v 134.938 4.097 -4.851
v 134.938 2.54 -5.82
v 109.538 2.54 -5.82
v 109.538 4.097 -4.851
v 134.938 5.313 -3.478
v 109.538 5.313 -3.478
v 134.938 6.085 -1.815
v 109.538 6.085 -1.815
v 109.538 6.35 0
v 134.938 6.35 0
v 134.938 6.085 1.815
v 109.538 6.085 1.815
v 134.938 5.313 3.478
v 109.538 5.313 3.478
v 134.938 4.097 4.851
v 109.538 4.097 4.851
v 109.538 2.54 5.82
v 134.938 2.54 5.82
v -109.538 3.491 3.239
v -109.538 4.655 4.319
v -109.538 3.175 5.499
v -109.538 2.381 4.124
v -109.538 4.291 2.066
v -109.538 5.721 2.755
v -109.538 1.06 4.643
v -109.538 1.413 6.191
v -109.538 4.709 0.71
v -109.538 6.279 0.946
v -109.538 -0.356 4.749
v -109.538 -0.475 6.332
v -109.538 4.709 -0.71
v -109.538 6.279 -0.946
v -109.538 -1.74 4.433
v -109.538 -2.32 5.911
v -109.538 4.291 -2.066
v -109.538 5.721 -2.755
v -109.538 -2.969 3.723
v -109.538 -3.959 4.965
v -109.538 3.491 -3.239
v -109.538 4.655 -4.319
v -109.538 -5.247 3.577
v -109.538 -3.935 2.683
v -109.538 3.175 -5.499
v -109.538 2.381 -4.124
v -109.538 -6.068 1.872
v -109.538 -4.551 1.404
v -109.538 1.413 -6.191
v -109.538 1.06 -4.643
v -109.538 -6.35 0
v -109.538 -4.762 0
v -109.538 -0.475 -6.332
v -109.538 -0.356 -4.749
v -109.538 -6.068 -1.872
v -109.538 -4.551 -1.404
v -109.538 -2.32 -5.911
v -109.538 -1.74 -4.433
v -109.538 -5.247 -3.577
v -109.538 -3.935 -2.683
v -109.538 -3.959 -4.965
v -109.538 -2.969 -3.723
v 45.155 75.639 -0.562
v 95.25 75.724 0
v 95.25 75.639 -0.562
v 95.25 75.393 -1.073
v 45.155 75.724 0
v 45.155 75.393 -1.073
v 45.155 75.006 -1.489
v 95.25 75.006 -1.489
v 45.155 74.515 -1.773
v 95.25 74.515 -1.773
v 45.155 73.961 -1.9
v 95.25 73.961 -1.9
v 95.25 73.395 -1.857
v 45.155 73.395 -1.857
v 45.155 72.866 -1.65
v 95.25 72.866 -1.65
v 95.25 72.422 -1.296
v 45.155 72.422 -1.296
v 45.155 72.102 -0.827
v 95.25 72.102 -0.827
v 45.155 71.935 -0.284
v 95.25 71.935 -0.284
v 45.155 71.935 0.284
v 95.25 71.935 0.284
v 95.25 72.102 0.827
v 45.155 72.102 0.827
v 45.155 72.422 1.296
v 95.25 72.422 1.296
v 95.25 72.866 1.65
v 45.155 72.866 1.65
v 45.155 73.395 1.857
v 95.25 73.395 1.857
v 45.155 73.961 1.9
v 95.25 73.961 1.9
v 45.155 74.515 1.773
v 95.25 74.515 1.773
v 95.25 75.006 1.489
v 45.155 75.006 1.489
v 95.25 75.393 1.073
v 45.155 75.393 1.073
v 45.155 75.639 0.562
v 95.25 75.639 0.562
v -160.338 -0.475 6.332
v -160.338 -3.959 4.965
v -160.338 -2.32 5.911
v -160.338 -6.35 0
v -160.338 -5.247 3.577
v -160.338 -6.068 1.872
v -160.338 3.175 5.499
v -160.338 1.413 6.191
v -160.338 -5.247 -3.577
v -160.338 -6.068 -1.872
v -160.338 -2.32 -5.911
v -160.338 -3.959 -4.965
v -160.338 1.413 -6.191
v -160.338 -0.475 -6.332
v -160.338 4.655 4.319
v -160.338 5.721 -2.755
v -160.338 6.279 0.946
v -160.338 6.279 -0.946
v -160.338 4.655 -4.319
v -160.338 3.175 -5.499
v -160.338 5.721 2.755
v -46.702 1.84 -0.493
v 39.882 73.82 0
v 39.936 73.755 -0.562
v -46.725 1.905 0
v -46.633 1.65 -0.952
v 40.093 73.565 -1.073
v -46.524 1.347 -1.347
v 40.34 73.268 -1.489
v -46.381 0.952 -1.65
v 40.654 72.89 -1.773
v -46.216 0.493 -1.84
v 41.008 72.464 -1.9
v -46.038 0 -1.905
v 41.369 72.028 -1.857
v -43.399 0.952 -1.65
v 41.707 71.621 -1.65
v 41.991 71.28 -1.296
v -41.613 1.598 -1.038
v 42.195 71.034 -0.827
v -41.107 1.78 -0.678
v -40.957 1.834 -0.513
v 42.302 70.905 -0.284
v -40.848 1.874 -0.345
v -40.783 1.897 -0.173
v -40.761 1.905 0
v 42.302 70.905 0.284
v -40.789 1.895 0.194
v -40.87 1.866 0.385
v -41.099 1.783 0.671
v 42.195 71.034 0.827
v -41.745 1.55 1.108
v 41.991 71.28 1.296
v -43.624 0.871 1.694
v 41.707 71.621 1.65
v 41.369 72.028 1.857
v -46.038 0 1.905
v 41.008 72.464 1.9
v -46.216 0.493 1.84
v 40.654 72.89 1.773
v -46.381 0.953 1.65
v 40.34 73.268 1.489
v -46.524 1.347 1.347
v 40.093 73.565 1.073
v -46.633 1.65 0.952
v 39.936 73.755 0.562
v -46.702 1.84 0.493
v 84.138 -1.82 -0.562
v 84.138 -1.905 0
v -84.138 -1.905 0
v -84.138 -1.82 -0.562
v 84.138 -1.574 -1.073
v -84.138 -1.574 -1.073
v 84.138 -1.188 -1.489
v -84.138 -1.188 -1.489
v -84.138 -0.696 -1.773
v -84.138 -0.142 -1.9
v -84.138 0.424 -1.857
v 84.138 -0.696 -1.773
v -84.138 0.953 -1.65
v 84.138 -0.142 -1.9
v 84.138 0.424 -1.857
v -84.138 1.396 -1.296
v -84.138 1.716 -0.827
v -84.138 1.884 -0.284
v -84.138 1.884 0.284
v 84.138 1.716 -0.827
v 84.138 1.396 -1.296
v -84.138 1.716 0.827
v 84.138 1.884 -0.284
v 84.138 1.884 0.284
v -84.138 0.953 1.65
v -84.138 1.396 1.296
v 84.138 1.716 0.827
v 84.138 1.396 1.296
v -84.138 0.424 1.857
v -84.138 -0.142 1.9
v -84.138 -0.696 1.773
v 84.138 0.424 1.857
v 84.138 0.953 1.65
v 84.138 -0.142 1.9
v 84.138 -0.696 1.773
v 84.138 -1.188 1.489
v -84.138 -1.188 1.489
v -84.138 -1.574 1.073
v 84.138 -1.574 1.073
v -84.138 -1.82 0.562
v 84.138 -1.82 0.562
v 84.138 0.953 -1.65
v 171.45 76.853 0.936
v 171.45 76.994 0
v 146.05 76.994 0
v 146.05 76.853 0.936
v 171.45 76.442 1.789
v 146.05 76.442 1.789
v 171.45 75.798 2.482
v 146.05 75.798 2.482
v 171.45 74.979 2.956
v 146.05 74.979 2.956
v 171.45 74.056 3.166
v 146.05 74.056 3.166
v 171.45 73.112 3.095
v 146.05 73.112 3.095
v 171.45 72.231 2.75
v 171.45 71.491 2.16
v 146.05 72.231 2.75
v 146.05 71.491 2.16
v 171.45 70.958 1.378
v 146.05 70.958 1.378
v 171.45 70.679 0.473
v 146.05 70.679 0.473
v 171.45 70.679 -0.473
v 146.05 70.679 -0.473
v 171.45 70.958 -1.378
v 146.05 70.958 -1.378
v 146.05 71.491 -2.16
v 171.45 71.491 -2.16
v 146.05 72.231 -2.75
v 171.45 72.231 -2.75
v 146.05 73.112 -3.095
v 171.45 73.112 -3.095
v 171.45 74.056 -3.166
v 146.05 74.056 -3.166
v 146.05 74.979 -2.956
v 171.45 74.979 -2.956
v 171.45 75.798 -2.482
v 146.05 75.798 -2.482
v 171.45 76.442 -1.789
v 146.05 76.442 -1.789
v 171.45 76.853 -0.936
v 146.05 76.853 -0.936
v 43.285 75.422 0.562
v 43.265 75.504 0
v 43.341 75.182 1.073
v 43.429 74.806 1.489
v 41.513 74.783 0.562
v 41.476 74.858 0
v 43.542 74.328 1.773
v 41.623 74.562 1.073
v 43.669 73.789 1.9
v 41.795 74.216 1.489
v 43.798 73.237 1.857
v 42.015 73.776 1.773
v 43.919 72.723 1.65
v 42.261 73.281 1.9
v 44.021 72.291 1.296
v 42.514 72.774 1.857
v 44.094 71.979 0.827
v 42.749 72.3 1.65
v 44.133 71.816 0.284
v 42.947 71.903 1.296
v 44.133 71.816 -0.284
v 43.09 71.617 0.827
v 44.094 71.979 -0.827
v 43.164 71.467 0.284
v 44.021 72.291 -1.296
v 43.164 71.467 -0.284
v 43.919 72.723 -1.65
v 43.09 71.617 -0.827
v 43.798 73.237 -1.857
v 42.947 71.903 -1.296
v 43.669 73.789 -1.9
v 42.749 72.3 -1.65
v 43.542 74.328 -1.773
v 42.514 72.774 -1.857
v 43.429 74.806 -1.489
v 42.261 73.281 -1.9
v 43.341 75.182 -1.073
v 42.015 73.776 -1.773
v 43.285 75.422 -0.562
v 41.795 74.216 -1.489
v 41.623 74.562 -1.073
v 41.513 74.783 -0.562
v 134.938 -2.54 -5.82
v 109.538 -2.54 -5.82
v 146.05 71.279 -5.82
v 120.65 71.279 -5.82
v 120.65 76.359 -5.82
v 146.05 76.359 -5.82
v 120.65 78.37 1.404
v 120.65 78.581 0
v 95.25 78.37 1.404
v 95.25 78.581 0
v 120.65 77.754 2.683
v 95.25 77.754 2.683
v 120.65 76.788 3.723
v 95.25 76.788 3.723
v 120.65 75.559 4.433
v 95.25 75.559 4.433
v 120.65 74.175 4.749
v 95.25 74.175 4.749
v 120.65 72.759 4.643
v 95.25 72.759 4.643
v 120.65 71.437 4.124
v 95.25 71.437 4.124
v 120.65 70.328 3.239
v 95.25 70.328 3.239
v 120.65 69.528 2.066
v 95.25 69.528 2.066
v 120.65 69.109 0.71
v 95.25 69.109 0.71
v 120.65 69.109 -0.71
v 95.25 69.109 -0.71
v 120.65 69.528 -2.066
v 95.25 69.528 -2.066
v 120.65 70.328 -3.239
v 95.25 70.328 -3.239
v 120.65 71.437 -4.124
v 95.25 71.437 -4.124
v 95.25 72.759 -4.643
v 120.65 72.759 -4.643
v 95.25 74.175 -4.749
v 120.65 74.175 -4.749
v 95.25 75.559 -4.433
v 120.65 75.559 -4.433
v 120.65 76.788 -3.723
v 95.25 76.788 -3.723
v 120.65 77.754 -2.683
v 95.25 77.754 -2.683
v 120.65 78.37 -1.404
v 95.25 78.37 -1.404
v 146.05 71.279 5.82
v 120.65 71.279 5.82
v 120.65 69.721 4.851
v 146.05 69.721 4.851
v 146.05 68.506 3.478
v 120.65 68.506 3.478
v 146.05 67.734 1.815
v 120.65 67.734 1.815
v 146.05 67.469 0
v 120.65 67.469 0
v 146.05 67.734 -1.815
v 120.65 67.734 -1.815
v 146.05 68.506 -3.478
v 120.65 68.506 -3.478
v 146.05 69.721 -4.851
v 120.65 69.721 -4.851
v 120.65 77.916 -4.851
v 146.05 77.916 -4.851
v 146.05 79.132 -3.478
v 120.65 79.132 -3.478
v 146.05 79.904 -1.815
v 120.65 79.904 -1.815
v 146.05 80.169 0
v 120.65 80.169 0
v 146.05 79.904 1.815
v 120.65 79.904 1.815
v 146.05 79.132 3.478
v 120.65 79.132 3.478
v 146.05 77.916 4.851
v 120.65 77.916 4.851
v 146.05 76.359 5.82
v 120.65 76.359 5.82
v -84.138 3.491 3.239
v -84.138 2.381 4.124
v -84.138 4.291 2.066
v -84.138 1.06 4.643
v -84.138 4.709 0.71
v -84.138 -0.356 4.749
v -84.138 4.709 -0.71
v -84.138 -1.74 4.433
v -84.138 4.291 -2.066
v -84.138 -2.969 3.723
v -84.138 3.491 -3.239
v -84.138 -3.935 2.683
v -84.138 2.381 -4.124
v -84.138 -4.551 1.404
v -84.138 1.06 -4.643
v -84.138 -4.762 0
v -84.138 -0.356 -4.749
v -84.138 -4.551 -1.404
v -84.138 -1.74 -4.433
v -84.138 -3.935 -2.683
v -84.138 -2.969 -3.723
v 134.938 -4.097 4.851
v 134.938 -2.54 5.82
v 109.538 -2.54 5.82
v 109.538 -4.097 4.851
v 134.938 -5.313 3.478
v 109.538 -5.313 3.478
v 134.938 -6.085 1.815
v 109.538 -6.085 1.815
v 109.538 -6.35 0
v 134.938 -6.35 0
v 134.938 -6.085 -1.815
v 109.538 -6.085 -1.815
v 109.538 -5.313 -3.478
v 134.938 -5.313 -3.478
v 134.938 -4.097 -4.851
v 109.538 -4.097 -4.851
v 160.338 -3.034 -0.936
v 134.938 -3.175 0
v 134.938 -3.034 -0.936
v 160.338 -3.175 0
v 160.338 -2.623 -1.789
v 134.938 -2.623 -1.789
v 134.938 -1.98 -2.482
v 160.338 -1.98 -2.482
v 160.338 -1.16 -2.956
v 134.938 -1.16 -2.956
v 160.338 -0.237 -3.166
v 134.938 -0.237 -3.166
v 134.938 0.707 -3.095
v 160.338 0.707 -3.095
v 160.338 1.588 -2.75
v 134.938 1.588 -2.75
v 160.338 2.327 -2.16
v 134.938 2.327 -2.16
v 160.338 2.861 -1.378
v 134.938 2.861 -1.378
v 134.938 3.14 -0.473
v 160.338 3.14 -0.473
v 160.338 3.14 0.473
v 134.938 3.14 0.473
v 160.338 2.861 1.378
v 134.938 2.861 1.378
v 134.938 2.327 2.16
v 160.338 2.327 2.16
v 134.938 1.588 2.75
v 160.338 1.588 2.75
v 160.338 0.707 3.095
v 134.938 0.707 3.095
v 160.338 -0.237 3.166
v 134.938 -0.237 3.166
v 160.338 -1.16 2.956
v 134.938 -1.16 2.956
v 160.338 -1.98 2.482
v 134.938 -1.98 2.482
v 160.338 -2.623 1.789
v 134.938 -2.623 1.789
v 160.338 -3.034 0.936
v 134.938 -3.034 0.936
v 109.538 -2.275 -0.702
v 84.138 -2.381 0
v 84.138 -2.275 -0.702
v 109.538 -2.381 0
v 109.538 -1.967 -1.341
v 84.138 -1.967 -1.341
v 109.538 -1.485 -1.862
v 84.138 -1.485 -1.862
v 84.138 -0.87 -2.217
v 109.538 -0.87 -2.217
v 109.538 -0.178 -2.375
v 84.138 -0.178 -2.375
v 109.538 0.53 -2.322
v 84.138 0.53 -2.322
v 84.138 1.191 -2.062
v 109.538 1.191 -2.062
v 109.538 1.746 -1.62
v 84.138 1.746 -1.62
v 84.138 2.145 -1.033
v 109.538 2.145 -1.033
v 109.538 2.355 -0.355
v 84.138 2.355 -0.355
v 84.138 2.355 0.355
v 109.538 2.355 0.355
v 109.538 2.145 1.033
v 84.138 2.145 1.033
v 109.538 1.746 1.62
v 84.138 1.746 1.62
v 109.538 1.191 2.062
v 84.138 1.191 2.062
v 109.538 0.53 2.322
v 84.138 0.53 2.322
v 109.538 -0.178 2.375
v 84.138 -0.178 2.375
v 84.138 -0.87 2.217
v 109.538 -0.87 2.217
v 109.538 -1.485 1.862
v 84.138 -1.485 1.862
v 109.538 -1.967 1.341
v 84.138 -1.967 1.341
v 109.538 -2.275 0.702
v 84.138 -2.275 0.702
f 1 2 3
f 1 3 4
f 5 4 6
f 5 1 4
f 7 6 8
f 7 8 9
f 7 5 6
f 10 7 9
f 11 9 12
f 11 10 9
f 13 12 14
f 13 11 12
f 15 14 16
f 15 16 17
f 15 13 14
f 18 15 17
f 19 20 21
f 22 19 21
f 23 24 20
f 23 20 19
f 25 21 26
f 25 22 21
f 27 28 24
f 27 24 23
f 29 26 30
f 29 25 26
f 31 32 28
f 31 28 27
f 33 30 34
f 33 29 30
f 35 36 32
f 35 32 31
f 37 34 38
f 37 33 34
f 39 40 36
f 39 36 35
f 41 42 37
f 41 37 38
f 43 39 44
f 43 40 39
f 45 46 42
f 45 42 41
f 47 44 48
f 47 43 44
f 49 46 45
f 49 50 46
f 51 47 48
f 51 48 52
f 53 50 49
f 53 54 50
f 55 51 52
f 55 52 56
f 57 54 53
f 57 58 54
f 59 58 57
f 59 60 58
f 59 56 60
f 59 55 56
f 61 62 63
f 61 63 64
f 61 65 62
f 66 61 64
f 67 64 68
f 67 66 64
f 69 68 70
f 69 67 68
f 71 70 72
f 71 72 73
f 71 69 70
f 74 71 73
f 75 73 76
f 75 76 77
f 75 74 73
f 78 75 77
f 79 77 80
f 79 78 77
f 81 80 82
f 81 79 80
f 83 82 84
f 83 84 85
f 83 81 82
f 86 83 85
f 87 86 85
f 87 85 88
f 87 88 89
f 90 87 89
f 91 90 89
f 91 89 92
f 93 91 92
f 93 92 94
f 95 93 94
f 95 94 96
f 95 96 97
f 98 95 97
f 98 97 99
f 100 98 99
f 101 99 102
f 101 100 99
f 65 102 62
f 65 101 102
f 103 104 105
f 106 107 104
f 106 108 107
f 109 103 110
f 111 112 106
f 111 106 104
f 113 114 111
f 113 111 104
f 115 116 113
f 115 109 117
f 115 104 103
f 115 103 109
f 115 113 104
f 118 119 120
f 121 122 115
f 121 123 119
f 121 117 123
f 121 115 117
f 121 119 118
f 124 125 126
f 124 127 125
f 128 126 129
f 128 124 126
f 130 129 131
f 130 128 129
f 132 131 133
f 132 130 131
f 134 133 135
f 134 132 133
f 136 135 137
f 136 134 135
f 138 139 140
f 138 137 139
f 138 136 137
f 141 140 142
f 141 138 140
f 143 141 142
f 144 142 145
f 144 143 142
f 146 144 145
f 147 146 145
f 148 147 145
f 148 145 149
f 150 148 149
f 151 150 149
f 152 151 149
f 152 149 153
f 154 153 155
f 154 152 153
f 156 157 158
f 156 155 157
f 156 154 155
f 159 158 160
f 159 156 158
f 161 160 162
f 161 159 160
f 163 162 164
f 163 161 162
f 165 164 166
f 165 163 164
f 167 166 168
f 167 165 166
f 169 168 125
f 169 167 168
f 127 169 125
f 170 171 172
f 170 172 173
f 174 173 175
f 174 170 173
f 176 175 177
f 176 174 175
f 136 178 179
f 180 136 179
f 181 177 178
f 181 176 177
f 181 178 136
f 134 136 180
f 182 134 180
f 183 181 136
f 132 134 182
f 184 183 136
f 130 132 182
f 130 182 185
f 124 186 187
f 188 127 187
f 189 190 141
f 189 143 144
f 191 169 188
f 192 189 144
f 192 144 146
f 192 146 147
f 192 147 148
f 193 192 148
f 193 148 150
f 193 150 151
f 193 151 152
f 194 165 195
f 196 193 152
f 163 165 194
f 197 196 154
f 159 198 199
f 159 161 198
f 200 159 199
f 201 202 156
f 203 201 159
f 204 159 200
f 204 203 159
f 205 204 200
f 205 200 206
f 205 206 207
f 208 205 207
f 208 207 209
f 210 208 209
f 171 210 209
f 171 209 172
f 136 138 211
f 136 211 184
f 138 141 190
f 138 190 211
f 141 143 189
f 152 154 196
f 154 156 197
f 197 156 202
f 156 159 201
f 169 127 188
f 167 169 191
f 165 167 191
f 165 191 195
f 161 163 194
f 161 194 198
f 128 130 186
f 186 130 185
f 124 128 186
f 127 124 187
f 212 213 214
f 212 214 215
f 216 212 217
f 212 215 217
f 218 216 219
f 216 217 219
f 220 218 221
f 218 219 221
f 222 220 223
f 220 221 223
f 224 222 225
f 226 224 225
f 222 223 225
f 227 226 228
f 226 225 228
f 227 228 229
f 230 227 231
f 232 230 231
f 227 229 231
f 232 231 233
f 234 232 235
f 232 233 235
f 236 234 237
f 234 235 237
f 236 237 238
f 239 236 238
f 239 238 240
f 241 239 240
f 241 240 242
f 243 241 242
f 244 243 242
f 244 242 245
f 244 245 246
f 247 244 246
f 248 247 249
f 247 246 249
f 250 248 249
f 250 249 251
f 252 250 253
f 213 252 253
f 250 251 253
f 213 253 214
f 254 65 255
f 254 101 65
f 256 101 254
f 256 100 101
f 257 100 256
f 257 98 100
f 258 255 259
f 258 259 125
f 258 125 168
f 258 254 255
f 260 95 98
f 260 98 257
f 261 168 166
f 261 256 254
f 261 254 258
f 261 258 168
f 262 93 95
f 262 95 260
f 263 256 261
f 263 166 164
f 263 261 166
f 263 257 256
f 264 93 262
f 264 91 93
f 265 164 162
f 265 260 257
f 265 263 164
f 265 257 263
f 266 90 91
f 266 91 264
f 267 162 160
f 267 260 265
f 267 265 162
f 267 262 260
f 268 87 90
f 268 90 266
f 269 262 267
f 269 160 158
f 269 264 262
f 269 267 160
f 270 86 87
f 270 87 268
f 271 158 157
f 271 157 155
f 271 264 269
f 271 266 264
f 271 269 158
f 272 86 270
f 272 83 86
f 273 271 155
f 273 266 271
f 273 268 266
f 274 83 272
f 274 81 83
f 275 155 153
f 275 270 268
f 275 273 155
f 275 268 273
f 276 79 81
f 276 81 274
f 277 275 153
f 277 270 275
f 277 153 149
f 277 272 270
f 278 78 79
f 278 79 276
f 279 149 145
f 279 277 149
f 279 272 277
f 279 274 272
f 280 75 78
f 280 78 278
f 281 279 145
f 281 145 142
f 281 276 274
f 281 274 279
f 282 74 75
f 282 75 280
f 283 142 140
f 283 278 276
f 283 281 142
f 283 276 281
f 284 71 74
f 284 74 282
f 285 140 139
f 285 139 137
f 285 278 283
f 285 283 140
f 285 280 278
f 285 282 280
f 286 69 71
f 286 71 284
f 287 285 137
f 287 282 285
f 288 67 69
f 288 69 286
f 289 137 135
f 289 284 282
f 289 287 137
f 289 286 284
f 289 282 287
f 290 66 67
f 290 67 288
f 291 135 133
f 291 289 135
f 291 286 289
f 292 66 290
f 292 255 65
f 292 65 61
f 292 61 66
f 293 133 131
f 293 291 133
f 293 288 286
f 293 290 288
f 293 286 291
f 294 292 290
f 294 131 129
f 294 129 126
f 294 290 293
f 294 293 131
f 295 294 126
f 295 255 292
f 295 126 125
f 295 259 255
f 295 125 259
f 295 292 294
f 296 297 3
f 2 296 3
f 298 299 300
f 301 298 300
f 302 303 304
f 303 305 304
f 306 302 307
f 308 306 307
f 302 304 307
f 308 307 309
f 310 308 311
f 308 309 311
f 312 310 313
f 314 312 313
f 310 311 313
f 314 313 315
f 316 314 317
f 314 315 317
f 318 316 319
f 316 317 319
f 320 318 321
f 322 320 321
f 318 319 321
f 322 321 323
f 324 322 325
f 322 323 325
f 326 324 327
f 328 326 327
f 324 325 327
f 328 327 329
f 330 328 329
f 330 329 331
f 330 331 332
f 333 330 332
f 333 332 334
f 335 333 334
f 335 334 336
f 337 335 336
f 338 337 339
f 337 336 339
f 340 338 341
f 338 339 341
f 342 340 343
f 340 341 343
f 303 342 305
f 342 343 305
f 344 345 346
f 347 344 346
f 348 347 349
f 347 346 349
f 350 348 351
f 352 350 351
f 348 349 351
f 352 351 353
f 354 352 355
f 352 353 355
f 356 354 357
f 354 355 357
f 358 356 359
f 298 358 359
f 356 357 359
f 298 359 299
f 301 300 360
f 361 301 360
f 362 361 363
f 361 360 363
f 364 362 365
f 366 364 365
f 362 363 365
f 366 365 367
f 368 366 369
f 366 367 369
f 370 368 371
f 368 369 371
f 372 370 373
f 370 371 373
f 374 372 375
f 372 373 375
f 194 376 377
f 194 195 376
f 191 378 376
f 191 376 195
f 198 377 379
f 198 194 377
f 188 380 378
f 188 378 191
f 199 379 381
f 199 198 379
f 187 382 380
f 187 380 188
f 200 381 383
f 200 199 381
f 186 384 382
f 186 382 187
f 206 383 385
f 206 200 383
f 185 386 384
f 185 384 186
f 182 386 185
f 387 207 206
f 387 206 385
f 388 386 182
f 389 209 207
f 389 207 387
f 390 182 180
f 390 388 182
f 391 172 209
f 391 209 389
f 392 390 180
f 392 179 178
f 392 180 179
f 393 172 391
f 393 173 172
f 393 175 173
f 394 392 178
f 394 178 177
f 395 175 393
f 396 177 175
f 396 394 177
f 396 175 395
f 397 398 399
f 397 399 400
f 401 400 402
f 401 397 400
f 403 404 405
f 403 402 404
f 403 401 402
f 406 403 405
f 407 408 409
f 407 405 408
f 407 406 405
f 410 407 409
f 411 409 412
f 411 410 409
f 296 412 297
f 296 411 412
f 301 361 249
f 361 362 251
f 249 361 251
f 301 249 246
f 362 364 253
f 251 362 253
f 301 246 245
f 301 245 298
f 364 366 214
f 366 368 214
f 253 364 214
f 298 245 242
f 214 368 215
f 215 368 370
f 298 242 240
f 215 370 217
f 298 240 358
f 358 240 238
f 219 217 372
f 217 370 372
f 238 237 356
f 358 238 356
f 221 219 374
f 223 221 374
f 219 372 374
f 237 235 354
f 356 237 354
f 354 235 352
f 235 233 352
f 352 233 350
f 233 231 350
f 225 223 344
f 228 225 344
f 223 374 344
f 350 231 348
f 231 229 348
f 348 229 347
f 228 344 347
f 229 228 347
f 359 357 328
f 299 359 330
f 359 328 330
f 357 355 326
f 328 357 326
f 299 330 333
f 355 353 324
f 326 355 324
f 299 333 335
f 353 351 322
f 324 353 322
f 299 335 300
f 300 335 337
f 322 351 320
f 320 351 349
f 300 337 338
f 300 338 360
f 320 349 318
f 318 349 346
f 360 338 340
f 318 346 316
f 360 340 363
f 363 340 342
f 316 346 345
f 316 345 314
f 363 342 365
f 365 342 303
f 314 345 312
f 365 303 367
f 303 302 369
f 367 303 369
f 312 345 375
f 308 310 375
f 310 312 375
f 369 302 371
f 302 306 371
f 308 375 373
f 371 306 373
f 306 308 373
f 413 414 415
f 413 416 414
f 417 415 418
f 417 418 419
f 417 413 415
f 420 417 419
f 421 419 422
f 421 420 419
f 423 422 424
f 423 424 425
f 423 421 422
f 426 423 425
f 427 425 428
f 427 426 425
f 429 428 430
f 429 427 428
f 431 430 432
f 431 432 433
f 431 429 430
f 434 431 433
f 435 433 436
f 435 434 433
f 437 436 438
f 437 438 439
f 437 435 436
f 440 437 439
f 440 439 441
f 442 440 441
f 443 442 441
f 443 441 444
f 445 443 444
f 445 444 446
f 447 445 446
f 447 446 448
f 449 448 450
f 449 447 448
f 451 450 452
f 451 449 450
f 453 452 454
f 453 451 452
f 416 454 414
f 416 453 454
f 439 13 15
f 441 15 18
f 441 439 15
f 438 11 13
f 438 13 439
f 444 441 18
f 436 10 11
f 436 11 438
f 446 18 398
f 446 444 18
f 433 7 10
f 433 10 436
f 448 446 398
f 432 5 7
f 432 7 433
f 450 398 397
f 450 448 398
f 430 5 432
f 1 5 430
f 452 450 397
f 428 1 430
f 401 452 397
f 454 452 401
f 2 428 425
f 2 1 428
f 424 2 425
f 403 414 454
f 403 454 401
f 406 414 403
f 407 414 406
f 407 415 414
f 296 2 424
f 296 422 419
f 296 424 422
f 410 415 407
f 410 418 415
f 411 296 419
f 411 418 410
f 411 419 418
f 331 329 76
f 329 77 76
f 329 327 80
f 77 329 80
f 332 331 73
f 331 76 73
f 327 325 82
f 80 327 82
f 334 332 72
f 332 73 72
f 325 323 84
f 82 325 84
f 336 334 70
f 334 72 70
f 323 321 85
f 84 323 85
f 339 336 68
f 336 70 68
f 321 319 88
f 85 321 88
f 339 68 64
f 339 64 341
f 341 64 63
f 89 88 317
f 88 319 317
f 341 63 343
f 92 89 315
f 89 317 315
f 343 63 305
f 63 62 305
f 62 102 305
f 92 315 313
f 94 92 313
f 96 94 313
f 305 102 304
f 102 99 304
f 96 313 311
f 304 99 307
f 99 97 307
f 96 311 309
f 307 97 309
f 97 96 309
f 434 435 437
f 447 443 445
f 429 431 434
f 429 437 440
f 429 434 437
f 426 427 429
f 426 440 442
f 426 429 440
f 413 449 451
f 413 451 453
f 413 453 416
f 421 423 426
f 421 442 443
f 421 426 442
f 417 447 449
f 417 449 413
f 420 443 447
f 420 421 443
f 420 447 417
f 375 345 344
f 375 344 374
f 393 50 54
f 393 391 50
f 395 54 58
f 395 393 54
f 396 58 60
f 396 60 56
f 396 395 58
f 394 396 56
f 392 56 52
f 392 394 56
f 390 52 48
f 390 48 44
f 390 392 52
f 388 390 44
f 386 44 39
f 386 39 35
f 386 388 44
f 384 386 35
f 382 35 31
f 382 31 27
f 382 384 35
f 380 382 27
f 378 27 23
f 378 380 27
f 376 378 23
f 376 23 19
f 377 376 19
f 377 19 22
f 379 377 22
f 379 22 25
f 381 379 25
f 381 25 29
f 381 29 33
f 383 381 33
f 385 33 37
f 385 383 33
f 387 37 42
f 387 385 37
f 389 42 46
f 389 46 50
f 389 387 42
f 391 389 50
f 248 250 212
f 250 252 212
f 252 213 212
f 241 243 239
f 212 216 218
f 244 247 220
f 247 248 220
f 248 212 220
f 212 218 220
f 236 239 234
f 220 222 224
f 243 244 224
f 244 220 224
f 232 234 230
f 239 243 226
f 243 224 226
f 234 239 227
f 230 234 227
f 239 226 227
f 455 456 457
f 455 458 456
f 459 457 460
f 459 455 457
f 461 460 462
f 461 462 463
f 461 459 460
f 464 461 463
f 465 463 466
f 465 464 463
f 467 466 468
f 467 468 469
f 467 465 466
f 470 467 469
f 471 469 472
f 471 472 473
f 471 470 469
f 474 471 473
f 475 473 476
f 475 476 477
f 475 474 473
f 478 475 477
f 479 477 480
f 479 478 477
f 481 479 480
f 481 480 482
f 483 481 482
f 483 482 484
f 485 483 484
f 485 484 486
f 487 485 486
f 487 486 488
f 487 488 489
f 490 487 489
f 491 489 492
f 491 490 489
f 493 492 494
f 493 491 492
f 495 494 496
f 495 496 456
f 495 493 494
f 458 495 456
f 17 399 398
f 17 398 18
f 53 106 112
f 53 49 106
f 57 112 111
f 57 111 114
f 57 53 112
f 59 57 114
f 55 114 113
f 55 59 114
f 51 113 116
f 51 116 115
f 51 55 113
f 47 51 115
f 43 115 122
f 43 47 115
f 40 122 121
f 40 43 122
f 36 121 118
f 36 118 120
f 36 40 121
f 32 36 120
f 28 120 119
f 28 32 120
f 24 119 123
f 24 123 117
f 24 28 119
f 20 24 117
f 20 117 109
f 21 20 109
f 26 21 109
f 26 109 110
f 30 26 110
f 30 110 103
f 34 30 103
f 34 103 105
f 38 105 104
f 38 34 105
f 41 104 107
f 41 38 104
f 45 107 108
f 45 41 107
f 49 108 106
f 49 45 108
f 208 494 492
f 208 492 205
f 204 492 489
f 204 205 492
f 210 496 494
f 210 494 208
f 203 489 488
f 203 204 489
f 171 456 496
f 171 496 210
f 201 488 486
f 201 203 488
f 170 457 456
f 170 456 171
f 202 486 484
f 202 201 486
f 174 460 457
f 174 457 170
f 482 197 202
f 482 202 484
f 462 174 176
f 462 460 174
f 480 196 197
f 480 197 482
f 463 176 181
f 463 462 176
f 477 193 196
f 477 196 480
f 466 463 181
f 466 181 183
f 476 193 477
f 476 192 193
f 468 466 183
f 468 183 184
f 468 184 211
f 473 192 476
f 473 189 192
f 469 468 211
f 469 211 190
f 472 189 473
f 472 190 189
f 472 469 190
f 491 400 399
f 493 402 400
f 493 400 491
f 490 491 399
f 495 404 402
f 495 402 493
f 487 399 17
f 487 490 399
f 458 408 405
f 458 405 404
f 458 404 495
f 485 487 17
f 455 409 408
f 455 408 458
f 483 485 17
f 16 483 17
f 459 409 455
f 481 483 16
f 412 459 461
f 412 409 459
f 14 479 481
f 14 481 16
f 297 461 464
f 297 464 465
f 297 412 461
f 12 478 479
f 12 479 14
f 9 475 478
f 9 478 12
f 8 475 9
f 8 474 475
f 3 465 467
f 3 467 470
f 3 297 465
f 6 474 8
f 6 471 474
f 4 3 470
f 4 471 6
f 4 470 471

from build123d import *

# Parameters (mm, degrees)
F3_R     = 1.905
F7_W     = 78.89875
F7_H     = 0.5301288674
F8_DEPTH = 171.451


with BuildPart() as f1:
    # F0 (on Top) → F1 (revolve)
    with BuildSketch(Plane.XY):
        Polygon((-46.0375, 0), (-160.3375, 0), (-160.3375, -6.35), (-109.5375, -6.35), (-109.5375, -4.7625), (-84.1375, -4.7625), (-84.1375, -1.905), (84.1375, -1.905), (84.1375, -2.38125), (109.5375, -2.38125), (109.5375, -6.35), (134.9375, -6.35), (134.9375, -3.175), (160.3375, -3.175), (160.3375, 0), align=None)
    revolve(axis=Axis((40.7620462889, 0, 0), (1, 0, 0)))

    # F4: sweep along a path in F0
    with BuildLine(Plane.XY) as f4_path:
        Line((171.45, 73.81875), (45.1552021657, 73.81875))
        ThreePointArc((45.1552021657, 73.81875), (42.9987538677, 73.4413734385), (41.0986183394, 72.3540982639))
        Line((41.0986183394, 72.3540982639), (-46.0375, 0))
    # F3 (on plane+point) → F4 (sweep)
    with BuildSketch(Plane.YZ.offset(171.45)):
        with Locations((73.81875, 0)):
            Circle(F3_R)
    sweep(path=f4_path.line)

    # F5 (on Top) → F6 (revolve)
    with BuildSketch(Plane.XY):
        Polygon((95.25, 73.81875), (171.45, 73.81875), (171.45, 76.99375), (146.05, 76.99375), (146.05, 80.16875), (120.65, 80.16875), (120.65, 78.58125), (95.25, 78.58125), align=None)
    revolve(axis=Axis((128.362800926, 73.81875, 0), (1, 0, 0)))

    # F7 (on Right) → F8 (cut, through all)
    with BuildSketch(Plane.YZ):
        with Locations((36.909375, 6.0849355663)):
            Rectangle(F7_W, F7_H)
        with Locations((36.909375, -6.0849355663)):
            Rectangle(F7_W, F7_H)
    extrude(amount=F8_DEPTH, mode=Mode.SUBTRACT)


solid = f1.part
